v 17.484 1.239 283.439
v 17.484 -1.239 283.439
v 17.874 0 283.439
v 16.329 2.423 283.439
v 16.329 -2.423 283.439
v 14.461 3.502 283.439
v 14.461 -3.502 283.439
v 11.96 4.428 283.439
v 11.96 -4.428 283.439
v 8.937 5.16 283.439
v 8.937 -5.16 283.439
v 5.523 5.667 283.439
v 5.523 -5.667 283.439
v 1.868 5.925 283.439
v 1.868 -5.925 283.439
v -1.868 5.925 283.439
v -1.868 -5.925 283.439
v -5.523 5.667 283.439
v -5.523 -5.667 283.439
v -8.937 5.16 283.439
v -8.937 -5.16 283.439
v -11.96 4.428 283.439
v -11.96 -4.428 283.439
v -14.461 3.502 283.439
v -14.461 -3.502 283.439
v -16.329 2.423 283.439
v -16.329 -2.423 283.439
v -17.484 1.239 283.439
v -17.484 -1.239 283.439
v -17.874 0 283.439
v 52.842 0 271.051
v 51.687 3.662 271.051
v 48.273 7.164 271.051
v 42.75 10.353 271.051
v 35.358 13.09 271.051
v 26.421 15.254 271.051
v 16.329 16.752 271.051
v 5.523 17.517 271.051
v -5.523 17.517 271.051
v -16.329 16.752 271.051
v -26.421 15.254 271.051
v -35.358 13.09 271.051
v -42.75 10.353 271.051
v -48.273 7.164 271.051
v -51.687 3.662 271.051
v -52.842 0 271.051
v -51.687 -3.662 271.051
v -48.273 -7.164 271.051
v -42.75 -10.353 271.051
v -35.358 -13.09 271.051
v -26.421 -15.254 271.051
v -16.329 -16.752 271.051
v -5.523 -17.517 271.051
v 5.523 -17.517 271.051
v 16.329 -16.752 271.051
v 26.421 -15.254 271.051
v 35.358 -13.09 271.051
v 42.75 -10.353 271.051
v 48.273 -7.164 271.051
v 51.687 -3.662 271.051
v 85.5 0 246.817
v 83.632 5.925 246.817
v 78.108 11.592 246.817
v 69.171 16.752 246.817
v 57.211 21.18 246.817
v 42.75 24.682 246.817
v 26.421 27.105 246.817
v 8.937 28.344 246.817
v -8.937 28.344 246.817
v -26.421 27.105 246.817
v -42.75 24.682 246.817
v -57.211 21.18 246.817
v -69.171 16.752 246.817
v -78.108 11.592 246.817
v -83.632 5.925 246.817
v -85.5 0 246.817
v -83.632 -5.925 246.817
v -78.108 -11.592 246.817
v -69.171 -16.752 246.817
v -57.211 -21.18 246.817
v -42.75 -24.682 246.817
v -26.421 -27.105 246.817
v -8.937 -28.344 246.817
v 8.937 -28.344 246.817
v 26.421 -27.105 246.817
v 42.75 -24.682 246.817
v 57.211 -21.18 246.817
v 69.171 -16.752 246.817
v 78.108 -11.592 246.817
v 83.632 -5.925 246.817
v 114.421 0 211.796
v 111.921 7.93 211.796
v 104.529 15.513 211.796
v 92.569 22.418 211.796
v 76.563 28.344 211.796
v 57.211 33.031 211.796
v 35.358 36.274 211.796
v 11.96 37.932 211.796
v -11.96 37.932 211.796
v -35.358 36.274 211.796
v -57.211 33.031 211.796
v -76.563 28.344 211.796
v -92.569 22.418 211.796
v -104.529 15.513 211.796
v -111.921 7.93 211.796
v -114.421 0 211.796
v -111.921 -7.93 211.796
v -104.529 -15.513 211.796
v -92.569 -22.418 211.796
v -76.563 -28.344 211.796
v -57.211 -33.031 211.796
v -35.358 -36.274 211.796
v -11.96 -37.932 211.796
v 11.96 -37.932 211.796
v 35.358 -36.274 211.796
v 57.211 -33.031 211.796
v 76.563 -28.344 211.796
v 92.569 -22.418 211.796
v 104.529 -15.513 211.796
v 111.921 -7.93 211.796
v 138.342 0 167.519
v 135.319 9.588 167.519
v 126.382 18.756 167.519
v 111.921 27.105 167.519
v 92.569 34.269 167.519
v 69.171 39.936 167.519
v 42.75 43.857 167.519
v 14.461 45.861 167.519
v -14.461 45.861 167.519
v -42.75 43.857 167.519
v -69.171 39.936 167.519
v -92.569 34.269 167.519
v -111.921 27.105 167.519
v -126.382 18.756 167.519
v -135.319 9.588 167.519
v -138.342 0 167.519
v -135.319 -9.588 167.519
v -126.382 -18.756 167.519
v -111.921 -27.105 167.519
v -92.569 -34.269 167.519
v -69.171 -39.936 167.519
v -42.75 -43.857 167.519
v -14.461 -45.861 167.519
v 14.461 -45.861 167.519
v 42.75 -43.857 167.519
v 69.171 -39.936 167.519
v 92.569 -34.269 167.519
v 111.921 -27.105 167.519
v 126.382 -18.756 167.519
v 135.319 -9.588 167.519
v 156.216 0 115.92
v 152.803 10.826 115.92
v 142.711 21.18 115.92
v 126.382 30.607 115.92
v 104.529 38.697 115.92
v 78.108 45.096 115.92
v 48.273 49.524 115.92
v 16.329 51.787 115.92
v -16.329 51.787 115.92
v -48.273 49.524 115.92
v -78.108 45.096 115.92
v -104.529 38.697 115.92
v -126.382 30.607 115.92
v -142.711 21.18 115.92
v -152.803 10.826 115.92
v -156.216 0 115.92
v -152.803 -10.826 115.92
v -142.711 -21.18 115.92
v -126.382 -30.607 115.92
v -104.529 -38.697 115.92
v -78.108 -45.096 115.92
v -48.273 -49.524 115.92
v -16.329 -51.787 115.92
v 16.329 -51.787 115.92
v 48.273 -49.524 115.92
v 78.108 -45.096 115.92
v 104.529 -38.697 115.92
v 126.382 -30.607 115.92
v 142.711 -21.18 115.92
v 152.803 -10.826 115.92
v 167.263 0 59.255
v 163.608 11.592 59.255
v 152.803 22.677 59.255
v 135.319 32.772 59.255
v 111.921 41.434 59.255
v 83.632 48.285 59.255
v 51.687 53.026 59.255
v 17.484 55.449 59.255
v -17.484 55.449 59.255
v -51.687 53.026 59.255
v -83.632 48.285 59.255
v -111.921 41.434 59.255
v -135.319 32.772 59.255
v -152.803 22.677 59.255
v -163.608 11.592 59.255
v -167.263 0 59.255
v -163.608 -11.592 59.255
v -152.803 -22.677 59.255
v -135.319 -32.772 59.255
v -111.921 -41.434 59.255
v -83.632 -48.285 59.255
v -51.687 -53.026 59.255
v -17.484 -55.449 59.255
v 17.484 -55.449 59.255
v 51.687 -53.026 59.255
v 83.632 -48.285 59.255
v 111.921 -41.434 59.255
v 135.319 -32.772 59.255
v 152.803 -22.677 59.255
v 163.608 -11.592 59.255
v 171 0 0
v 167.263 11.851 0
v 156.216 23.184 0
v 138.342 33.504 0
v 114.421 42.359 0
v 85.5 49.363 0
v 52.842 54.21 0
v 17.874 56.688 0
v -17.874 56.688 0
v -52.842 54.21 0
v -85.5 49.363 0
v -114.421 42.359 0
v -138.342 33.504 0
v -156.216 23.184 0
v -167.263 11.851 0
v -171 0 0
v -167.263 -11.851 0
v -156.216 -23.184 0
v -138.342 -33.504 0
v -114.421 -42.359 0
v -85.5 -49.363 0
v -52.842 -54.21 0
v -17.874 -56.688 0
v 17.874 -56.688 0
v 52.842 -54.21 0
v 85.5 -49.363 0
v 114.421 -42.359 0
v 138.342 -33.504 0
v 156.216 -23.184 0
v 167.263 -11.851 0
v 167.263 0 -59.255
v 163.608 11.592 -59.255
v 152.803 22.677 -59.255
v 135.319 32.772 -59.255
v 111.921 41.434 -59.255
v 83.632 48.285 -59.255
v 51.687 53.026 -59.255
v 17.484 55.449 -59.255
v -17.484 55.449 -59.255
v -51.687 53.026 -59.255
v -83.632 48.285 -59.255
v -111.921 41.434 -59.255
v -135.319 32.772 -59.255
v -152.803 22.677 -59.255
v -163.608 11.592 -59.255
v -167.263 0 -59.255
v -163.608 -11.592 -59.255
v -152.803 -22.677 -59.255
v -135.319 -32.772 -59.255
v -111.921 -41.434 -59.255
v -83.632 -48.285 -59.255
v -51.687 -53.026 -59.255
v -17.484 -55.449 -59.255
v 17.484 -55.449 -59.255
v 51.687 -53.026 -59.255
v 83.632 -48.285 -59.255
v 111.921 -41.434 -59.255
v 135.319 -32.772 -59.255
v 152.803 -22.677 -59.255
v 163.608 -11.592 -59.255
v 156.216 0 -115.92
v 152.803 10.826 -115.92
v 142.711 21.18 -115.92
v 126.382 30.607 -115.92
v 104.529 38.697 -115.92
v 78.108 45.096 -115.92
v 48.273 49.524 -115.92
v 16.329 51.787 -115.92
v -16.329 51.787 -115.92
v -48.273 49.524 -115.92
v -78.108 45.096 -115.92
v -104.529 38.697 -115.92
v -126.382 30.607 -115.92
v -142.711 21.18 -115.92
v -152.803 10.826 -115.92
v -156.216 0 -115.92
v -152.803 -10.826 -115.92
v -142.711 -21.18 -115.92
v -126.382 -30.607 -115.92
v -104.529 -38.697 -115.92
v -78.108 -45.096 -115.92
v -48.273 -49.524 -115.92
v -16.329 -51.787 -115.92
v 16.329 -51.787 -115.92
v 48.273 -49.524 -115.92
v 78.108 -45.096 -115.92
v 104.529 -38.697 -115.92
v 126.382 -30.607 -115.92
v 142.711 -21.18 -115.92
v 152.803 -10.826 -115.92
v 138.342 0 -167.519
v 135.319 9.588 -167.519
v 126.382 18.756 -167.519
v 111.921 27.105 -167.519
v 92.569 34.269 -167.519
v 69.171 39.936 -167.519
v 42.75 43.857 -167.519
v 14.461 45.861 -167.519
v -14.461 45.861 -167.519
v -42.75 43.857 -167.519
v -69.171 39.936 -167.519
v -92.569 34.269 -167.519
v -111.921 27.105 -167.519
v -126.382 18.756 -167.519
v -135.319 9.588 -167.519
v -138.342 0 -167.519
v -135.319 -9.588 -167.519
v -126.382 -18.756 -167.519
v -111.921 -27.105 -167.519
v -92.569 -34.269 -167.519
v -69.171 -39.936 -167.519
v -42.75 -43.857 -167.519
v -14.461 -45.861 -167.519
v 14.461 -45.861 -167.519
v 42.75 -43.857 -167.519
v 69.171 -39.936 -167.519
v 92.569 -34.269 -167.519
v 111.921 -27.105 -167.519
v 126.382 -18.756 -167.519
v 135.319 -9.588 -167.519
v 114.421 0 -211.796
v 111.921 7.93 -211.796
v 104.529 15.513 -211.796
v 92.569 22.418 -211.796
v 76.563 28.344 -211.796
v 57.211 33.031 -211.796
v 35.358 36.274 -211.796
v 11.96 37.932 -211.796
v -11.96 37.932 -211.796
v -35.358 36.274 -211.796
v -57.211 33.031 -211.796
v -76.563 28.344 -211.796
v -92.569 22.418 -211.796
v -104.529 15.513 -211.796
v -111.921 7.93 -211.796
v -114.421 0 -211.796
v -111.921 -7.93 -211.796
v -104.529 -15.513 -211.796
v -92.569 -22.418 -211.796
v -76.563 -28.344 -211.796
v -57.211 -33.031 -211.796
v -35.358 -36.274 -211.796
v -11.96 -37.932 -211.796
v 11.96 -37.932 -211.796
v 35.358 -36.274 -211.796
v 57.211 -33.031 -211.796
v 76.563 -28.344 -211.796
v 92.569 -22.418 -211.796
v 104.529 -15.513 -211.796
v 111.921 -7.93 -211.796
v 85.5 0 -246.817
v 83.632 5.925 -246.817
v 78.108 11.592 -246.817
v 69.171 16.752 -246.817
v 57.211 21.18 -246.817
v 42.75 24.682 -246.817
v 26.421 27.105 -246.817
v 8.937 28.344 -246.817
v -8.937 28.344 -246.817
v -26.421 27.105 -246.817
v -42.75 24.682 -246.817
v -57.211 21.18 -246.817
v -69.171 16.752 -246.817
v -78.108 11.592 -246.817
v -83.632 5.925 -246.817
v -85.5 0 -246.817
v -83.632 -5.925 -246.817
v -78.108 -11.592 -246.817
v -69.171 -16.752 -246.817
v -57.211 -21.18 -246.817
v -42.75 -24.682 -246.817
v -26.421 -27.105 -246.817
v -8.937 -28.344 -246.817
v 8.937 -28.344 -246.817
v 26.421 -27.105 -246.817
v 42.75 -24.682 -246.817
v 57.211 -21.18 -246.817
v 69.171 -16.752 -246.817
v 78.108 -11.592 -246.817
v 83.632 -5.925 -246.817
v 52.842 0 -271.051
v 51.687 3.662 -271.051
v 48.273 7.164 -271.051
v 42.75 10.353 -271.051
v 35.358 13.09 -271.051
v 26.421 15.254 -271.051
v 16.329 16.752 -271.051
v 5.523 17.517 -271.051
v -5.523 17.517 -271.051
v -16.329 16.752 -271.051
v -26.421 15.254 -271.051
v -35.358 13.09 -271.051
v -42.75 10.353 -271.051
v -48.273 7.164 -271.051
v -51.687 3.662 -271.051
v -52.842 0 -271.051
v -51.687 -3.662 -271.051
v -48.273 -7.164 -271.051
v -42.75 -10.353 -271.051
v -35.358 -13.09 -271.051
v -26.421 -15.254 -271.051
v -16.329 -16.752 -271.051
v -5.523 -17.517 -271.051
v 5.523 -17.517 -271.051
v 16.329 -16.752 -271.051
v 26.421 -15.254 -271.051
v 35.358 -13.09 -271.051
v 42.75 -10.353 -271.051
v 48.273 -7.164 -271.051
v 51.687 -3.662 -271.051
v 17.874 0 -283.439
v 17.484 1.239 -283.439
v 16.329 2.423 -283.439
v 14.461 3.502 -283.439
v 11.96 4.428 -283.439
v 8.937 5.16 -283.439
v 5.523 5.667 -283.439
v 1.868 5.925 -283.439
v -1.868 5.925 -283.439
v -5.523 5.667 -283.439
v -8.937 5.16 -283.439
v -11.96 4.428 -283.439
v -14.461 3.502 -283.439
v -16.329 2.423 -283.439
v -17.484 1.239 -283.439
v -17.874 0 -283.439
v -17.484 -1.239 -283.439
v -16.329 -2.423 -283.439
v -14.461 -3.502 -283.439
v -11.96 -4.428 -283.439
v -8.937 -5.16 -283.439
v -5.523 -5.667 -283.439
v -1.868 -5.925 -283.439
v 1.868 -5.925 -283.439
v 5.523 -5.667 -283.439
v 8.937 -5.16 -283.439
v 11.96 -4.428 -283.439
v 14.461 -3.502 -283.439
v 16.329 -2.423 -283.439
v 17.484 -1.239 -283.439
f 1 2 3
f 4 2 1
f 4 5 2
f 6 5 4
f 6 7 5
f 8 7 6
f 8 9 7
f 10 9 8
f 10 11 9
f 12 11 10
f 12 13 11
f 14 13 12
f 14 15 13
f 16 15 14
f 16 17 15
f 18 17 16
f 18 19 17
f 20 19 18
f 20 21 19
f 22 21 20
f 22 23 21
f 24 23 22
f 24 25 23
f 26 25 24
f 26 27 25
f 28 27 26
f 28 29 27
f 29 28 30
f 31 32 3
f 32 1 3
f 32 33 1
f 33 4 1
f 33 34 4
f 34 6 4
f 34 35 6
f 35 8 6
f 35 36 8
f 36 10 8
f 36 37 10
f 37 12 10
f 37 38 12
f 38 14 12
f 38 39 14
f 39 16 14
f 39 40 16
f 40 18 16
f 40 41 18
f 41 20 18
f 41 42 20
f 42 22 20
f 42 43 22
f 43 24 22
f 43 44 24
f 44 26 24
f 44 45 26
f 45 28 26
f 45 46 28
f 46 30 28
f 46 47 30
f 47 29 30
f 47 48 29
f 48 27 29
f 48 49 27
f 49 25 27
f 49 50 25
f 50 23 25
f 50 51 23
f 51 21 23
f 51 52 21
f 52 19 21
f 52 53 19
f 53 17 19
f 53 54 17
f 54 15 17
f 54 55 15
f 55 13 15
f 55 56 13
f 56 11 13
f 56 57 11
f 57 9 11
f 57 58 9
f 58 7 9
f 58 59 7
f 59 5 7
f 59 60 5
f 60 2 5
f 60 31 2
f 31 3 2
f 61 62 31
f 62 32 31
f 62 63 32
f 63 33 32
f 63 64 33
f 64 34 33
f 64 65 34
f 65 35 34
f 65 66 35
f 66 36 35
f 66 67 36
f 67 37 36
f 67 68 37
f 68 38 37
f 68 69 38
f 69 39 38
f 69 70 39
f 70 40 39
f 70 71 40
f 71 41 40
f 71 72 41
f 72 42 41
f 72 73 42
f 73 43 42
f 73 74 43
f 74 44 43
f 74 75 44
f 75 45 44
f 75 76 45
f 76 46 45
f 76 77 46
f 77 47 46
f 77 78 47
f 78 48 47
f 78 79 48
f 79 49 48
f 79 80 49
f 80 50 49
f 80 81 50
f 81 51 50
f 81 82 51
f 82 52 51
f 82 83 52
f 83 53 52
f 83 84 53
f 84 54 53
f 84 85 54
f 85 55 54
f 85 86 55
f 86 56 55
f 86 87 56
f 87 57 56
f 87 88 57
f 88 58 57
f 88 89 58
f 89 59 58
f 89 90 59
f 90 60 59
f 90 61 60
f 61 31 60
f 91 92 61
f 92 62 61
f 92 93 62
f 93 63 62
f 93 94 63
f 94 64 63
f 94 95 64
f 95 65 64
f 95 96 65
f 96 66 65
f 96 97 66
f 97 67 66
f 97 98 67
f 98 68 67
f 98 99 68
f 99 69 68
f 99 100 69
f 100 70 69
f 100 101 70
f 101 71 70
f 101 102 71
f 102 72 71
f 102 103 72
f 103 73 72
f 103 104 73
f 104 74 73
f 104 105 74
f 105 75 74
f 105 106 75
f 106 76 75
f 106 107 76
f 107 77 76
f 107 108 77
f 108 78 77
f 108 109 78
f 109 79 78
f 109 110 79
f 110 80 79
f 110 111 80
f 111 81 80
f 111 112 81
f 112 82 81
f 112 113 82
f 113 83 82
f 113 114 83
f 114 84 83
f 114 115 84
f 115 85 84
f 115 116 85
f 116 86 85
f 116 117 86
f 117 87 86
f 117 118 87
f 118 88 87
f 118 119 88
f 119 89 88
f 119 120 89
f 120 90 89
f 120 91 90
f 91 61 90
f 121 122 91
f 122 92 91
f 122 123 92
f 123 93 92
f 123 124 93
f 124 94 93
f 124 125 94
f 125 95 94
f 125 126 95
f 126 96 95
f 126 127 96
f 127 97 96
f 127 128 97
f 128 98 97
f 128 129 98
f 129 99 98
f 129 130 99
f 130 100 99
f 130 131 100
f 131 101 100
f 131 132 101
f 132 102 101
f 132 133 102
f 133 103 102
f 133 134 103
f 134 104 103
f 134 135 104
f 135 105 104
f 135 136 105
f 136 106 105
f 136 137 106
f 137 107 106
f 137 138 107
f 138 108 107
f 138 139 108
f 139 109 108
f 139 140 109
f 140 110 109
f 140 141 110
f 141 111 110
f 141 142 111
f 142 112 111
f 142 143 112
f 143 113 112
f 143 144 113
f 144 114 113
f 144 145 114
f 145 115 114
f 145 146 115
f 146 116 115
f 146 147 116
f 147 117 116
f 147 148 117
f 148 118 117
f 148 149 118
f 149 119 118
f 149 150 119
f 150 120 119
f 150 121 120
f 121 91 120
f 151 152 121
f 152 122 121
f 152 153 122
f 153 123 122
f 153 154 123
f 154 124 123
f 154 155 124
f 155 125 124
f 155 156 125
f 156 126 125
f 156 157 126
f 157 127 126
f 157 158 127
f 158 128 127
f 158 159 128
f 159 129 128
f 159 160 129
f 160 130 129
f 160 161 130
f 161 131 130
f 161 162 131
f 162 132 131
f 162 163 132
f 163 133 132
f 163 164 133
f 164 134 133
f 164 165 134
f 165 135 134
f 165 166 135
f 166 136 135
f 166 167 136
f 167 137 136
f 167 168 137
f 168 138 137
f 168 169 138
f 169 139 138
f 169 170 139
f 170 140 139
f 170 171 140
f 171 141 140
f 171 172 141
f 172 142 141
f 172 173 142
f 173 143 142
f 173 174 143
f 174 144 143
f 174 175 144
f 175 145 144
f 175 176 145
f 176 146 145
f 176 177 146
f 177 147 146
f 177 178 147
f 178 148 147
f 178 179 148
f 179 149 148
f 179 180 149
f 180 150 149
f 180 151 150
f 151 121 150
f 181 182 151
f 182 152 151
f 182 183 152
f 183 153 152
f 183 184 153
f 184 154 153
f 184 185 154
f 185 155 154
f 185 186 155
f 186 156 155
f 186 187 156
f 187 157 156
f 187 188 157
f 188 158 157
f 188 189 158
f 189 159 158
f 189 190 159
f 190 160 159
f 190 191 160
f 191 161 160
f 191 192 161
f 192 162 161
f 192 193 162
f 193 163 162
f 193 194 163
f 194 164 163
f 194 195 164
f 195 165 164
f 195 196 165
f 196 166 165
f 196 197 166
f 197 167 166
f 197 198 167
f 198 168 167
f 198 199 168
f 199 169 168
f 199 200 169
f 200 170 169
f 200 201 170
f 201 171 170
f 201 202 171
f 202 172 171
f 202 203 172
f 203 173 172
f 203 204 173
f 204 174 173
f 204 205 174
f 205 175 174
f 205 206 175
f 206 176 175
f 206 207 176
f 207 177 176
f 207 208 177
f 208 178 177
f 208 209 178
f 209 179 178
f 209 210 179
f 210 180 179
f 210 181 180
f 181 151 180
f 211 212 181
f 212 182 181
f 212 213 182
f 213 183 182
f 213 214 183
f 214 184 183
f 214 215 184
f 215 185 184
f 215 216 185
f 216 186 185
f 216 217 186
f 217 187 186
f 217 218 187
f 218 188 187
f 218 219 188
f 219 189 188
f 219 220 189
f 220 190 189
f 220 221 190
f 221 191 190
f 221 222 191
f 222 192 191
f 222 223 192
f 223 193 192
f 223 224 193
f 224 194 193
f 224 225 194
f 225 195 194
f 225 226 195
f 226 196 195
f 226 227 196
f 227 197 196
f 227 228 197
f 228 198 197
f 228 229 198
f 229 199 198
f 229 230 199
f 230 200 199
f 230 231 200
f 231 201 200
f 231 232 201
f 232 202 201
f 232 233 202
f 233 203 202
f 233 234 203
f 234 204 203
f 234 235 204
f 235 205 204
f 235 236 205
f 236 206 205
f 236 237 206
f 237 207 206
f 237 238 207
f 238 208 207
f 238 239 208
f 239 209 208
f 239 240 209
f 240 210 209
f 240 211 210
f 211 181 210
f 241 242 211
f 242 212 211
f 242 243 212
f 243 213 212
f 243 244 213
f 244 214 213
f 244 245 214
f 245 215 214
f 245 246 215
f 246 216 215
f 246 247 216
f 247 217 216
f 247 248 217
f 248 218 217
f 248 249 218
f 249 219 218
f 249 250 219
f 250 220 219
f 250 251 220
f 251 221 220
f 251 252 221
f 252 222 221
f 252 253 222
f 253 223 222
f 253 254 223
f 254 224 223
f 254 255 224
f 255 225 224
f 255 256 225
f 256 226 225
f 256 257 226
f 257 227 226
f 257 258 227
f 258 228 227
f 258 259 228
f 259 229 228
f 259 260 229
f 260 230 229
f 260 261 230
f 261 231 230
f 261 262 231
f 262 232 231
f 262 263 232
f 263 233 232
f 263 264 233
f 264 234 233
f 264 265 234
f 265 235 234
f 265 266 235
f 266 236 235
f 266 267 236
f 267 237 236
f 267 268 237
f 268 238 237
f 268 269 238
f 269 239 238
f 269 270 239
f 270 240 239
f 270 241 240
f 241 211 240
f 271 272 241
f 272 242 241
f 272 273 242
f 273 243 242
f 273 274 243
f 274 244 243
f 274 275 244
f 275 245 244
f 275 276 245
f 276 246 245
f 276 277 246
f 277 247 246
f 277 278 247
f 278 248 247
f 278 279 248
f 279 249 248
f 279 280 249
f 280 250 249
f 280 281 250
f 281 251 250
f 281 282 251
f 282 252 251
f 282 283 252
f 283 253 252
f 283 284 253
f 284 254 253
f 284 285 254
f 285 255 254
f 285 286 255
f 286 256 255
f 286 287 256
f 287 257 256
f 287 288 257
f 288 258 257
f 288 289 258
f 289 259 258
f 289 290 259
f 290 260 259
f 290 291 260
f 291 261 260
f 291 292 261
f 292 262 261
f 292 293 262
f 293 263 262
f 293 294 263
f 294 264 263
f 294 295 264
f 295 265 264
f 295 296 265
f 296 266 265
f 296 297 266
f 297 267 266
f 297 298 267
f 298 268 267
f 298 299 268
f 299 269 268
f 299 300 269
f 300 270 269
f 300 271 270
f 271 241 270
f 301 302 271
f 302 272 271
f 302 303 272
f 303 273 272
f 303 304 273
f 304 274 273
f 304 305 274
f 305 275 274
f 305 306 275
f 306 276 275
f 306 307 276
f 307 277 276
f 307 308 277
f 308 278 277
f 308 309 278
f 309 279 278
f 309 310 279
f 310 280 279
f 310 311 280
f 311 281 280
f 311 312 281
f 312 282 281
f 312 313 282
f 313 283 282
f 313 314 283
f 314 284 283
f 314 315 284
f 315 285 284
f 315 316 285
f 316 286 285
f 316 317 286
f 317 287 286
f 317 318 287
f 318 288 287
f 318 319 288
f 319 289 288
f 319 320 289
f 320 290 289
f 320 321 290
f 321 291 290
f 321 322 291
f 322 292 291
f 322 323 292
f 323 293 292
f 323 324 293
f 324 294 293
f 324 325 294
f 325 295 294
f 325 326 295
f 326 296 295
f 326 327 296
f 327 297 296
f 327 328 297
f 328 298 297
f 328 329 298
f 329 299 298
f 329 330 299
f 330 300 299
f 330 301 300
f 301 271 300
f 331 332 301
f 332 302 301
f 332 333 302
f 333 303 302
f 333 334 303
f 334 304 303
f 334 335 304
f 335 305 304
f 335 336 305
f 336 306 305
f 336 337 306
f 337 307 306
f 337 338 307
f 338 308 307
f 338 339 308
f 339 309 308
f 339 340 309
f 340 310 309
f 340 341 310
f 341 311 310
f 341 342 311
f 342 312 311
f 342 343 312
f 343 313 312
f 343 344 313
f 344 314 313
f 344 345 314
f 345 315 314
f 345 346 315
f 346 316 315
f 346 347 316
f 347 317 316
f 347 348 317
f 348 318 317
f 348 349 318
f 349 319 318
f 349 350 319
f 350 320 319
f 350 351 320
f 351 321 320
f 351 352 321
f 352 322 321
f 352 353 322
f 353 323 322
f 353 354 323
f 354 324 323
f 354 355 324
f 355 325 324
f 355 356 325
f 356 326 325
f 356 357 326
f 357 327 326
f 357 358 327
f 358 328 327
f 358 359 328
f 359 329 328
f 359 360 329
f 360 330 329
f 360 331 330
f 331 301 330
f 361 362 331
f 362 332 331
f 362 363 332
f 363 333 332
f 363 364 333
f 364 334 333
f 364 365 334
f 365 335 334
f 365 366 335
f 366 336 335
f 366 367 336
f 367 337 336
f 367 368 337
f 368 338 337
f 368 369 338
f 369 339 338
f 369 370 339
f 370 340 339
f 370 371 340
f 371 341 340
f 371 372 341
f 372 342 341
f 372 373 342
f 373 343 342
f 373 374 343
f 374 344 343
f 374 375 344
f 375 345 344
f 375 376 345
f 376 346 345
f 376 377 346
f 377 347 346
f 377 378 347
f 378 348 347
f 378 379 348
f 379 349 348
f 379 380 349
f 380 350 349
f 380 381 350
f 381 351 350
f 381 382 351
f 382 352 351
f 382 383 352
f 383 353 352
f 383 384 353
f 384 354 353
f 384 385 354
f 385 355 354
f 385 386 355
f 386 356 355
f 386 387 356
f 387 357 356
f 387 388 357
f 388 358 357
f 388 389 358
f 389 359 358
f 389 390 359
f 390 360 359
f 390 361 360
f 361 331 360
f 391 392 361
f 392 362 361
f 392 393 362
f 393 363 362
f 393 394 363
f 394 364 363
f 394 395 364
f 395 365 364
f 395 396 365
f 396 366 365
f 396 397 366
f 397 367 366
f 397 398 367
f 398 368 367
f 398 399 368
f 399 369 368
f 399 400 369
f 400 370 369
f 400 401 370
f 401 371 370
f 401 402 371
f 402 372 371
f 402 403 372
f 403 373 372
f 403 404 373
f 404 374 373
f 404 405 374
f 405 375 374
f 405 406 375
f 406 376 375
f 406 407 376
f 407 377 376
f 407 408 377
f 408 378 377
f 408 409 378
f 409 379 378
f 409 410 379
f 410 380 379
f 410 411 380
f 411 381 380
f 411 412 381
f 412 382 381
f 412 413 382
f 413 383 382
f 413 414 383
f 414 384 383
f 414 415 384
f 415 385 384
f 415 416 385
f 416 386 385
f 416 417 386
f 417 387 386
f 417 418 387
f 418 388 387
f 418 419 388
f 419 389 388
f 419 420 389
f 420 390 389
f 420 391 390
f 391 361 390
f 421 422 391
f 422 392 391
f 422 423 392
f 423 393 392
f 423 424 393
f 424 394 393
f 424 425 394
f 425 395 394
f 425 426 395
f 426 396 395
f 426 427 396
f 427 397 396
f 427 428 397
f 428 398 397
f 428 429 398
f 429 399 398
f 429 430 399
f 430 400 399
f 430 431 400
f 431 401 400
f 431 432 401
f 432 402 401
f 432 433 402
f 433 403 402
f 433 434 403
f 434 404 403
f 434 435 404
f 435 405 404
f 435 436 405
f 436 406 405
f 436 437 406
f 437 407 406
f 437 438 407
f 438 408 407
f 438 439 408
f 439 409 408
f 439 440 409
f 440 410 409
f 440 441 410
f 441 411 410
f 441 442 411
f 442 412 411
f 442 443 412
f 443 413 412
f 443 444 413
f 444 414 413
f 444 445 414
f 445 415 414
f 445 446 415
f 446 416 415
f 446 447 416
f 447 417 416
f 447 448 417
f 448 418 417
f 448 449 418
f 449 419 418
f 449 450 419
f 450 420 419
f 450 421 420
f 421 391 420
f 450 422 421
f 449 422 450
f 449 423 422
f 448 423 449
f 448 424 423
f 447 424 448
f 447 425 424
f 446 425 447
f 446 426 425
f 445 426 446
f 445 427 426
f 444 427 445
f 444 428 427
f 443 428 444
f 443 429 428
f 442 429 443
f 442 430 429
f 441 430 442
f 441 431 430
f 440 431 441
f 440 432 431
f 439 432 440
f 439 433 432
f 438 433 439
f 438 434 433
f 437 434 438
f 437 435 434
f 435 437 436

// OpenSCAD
// Generated by SolidPython 1.0.1 on 2020-07-29 00:46:48


scale(v = [9, 3, 15]) {
	sphere(r = 19);
}
/***********************************************
*********      SolidPython code:      **********
************************************************
 
# import packages: SolidPython
from solid import *
from solid.utils import *
from itertools import chain, combinations, permutations


class Resize:

    def __init__(self, scad_file):
        self.scad_file = scad_file
        #self.scad_file = import_scad(scad_file)
        # cone/cylinder param:
        self.r1 = 0
        self.r2 = 0
        self.h = 0
        # rectangular prism param:
        self.w = 0
        self.l = 0
        # ellipse param:
        self.r = 0

    # import OpenScad code (file name corresponds to shape)


    # classify shape + parameters
    def assign(self, param1, param2, param3):
        if self.scad_file == 'cone.scad':
            self.r1 = param1
            self.r2 = param2
            self.h = param3
        elif self.scad_file == 'cylinder.scad':
            self.r1 = param1
            self.r2 = param2
            self.h = param3
        elif self.scad_file == 'rectangularPrism.scad':
            self.h = param1
            self.l = param2
            self.w = param3
        else:
            self.r = param1
            self.h = param2

    # resize parameters
    def iterate(self):
        x = range(3, 20, 2)
        i = 1
        if self.scad_file == 'cone.scad':
            tempList = list(permutations(x, 2))
            for temp in tempList:
                param1 = temp[0]
                param2 = temp[1]
                filepath = 'produced_scad_files/' + 'cone' + str(param1) + '_' + str(param2) + '_' + '.scad'
                scad_render_to_file(cylinder(h=param1, r1=param2, r2=0), filepath)

        elif self.scad_file == 'cylinder.scad':
            tempList = list(permutations(x, 3))
            for temp in tempList:
                param1 = temp[0]
                param2 = temp[1]
                filepath = 'produced_scad_files/' + 'cylinder' + str(param1) + '_' + str(param2) + '_' + '.scad'
                scad_render_to_file(cylinder(h=param1, r1=param2, r2=param2), filepath)

        elif self.scad_file == 'rectangularPrism.scad':
            tempList = list(permutations(x, 3))
            for temp in tempList:
                param1 = temp[0]
                param2 = temp[1]
                param3 = temp[2]
                filepath = 'produced_scad_files/' + 'rectangularPrism' + str(param1) + '_' + str(param2) + '_' + str(
                    param3) + '.scad'
                scad_render_to_file(cube(size=(param1, param2, param3)), filepath)

        elif self.scad_file == 'ellipse.scad':
            tempList = list(permutations(x, 4))
            for temp in tempList:
                param1 = temp[0]
                param2 = temp[1]
                param3 = temp[2]
                param4 = temp[3]
                filepath = 'produced_scad_files/' + 'ellipse' + str(param1) + '_' + str(param2) + '_' + str(param3) + '_' + str(param4) + '.scad'
                scad_render_to_file(scale([param1, param2, param3])(sphere(r=param4)), filepath)

    def render_to_scadfile(self):
        scad_render_to_file(scad, 'example.scad') 
 
************************************************/
